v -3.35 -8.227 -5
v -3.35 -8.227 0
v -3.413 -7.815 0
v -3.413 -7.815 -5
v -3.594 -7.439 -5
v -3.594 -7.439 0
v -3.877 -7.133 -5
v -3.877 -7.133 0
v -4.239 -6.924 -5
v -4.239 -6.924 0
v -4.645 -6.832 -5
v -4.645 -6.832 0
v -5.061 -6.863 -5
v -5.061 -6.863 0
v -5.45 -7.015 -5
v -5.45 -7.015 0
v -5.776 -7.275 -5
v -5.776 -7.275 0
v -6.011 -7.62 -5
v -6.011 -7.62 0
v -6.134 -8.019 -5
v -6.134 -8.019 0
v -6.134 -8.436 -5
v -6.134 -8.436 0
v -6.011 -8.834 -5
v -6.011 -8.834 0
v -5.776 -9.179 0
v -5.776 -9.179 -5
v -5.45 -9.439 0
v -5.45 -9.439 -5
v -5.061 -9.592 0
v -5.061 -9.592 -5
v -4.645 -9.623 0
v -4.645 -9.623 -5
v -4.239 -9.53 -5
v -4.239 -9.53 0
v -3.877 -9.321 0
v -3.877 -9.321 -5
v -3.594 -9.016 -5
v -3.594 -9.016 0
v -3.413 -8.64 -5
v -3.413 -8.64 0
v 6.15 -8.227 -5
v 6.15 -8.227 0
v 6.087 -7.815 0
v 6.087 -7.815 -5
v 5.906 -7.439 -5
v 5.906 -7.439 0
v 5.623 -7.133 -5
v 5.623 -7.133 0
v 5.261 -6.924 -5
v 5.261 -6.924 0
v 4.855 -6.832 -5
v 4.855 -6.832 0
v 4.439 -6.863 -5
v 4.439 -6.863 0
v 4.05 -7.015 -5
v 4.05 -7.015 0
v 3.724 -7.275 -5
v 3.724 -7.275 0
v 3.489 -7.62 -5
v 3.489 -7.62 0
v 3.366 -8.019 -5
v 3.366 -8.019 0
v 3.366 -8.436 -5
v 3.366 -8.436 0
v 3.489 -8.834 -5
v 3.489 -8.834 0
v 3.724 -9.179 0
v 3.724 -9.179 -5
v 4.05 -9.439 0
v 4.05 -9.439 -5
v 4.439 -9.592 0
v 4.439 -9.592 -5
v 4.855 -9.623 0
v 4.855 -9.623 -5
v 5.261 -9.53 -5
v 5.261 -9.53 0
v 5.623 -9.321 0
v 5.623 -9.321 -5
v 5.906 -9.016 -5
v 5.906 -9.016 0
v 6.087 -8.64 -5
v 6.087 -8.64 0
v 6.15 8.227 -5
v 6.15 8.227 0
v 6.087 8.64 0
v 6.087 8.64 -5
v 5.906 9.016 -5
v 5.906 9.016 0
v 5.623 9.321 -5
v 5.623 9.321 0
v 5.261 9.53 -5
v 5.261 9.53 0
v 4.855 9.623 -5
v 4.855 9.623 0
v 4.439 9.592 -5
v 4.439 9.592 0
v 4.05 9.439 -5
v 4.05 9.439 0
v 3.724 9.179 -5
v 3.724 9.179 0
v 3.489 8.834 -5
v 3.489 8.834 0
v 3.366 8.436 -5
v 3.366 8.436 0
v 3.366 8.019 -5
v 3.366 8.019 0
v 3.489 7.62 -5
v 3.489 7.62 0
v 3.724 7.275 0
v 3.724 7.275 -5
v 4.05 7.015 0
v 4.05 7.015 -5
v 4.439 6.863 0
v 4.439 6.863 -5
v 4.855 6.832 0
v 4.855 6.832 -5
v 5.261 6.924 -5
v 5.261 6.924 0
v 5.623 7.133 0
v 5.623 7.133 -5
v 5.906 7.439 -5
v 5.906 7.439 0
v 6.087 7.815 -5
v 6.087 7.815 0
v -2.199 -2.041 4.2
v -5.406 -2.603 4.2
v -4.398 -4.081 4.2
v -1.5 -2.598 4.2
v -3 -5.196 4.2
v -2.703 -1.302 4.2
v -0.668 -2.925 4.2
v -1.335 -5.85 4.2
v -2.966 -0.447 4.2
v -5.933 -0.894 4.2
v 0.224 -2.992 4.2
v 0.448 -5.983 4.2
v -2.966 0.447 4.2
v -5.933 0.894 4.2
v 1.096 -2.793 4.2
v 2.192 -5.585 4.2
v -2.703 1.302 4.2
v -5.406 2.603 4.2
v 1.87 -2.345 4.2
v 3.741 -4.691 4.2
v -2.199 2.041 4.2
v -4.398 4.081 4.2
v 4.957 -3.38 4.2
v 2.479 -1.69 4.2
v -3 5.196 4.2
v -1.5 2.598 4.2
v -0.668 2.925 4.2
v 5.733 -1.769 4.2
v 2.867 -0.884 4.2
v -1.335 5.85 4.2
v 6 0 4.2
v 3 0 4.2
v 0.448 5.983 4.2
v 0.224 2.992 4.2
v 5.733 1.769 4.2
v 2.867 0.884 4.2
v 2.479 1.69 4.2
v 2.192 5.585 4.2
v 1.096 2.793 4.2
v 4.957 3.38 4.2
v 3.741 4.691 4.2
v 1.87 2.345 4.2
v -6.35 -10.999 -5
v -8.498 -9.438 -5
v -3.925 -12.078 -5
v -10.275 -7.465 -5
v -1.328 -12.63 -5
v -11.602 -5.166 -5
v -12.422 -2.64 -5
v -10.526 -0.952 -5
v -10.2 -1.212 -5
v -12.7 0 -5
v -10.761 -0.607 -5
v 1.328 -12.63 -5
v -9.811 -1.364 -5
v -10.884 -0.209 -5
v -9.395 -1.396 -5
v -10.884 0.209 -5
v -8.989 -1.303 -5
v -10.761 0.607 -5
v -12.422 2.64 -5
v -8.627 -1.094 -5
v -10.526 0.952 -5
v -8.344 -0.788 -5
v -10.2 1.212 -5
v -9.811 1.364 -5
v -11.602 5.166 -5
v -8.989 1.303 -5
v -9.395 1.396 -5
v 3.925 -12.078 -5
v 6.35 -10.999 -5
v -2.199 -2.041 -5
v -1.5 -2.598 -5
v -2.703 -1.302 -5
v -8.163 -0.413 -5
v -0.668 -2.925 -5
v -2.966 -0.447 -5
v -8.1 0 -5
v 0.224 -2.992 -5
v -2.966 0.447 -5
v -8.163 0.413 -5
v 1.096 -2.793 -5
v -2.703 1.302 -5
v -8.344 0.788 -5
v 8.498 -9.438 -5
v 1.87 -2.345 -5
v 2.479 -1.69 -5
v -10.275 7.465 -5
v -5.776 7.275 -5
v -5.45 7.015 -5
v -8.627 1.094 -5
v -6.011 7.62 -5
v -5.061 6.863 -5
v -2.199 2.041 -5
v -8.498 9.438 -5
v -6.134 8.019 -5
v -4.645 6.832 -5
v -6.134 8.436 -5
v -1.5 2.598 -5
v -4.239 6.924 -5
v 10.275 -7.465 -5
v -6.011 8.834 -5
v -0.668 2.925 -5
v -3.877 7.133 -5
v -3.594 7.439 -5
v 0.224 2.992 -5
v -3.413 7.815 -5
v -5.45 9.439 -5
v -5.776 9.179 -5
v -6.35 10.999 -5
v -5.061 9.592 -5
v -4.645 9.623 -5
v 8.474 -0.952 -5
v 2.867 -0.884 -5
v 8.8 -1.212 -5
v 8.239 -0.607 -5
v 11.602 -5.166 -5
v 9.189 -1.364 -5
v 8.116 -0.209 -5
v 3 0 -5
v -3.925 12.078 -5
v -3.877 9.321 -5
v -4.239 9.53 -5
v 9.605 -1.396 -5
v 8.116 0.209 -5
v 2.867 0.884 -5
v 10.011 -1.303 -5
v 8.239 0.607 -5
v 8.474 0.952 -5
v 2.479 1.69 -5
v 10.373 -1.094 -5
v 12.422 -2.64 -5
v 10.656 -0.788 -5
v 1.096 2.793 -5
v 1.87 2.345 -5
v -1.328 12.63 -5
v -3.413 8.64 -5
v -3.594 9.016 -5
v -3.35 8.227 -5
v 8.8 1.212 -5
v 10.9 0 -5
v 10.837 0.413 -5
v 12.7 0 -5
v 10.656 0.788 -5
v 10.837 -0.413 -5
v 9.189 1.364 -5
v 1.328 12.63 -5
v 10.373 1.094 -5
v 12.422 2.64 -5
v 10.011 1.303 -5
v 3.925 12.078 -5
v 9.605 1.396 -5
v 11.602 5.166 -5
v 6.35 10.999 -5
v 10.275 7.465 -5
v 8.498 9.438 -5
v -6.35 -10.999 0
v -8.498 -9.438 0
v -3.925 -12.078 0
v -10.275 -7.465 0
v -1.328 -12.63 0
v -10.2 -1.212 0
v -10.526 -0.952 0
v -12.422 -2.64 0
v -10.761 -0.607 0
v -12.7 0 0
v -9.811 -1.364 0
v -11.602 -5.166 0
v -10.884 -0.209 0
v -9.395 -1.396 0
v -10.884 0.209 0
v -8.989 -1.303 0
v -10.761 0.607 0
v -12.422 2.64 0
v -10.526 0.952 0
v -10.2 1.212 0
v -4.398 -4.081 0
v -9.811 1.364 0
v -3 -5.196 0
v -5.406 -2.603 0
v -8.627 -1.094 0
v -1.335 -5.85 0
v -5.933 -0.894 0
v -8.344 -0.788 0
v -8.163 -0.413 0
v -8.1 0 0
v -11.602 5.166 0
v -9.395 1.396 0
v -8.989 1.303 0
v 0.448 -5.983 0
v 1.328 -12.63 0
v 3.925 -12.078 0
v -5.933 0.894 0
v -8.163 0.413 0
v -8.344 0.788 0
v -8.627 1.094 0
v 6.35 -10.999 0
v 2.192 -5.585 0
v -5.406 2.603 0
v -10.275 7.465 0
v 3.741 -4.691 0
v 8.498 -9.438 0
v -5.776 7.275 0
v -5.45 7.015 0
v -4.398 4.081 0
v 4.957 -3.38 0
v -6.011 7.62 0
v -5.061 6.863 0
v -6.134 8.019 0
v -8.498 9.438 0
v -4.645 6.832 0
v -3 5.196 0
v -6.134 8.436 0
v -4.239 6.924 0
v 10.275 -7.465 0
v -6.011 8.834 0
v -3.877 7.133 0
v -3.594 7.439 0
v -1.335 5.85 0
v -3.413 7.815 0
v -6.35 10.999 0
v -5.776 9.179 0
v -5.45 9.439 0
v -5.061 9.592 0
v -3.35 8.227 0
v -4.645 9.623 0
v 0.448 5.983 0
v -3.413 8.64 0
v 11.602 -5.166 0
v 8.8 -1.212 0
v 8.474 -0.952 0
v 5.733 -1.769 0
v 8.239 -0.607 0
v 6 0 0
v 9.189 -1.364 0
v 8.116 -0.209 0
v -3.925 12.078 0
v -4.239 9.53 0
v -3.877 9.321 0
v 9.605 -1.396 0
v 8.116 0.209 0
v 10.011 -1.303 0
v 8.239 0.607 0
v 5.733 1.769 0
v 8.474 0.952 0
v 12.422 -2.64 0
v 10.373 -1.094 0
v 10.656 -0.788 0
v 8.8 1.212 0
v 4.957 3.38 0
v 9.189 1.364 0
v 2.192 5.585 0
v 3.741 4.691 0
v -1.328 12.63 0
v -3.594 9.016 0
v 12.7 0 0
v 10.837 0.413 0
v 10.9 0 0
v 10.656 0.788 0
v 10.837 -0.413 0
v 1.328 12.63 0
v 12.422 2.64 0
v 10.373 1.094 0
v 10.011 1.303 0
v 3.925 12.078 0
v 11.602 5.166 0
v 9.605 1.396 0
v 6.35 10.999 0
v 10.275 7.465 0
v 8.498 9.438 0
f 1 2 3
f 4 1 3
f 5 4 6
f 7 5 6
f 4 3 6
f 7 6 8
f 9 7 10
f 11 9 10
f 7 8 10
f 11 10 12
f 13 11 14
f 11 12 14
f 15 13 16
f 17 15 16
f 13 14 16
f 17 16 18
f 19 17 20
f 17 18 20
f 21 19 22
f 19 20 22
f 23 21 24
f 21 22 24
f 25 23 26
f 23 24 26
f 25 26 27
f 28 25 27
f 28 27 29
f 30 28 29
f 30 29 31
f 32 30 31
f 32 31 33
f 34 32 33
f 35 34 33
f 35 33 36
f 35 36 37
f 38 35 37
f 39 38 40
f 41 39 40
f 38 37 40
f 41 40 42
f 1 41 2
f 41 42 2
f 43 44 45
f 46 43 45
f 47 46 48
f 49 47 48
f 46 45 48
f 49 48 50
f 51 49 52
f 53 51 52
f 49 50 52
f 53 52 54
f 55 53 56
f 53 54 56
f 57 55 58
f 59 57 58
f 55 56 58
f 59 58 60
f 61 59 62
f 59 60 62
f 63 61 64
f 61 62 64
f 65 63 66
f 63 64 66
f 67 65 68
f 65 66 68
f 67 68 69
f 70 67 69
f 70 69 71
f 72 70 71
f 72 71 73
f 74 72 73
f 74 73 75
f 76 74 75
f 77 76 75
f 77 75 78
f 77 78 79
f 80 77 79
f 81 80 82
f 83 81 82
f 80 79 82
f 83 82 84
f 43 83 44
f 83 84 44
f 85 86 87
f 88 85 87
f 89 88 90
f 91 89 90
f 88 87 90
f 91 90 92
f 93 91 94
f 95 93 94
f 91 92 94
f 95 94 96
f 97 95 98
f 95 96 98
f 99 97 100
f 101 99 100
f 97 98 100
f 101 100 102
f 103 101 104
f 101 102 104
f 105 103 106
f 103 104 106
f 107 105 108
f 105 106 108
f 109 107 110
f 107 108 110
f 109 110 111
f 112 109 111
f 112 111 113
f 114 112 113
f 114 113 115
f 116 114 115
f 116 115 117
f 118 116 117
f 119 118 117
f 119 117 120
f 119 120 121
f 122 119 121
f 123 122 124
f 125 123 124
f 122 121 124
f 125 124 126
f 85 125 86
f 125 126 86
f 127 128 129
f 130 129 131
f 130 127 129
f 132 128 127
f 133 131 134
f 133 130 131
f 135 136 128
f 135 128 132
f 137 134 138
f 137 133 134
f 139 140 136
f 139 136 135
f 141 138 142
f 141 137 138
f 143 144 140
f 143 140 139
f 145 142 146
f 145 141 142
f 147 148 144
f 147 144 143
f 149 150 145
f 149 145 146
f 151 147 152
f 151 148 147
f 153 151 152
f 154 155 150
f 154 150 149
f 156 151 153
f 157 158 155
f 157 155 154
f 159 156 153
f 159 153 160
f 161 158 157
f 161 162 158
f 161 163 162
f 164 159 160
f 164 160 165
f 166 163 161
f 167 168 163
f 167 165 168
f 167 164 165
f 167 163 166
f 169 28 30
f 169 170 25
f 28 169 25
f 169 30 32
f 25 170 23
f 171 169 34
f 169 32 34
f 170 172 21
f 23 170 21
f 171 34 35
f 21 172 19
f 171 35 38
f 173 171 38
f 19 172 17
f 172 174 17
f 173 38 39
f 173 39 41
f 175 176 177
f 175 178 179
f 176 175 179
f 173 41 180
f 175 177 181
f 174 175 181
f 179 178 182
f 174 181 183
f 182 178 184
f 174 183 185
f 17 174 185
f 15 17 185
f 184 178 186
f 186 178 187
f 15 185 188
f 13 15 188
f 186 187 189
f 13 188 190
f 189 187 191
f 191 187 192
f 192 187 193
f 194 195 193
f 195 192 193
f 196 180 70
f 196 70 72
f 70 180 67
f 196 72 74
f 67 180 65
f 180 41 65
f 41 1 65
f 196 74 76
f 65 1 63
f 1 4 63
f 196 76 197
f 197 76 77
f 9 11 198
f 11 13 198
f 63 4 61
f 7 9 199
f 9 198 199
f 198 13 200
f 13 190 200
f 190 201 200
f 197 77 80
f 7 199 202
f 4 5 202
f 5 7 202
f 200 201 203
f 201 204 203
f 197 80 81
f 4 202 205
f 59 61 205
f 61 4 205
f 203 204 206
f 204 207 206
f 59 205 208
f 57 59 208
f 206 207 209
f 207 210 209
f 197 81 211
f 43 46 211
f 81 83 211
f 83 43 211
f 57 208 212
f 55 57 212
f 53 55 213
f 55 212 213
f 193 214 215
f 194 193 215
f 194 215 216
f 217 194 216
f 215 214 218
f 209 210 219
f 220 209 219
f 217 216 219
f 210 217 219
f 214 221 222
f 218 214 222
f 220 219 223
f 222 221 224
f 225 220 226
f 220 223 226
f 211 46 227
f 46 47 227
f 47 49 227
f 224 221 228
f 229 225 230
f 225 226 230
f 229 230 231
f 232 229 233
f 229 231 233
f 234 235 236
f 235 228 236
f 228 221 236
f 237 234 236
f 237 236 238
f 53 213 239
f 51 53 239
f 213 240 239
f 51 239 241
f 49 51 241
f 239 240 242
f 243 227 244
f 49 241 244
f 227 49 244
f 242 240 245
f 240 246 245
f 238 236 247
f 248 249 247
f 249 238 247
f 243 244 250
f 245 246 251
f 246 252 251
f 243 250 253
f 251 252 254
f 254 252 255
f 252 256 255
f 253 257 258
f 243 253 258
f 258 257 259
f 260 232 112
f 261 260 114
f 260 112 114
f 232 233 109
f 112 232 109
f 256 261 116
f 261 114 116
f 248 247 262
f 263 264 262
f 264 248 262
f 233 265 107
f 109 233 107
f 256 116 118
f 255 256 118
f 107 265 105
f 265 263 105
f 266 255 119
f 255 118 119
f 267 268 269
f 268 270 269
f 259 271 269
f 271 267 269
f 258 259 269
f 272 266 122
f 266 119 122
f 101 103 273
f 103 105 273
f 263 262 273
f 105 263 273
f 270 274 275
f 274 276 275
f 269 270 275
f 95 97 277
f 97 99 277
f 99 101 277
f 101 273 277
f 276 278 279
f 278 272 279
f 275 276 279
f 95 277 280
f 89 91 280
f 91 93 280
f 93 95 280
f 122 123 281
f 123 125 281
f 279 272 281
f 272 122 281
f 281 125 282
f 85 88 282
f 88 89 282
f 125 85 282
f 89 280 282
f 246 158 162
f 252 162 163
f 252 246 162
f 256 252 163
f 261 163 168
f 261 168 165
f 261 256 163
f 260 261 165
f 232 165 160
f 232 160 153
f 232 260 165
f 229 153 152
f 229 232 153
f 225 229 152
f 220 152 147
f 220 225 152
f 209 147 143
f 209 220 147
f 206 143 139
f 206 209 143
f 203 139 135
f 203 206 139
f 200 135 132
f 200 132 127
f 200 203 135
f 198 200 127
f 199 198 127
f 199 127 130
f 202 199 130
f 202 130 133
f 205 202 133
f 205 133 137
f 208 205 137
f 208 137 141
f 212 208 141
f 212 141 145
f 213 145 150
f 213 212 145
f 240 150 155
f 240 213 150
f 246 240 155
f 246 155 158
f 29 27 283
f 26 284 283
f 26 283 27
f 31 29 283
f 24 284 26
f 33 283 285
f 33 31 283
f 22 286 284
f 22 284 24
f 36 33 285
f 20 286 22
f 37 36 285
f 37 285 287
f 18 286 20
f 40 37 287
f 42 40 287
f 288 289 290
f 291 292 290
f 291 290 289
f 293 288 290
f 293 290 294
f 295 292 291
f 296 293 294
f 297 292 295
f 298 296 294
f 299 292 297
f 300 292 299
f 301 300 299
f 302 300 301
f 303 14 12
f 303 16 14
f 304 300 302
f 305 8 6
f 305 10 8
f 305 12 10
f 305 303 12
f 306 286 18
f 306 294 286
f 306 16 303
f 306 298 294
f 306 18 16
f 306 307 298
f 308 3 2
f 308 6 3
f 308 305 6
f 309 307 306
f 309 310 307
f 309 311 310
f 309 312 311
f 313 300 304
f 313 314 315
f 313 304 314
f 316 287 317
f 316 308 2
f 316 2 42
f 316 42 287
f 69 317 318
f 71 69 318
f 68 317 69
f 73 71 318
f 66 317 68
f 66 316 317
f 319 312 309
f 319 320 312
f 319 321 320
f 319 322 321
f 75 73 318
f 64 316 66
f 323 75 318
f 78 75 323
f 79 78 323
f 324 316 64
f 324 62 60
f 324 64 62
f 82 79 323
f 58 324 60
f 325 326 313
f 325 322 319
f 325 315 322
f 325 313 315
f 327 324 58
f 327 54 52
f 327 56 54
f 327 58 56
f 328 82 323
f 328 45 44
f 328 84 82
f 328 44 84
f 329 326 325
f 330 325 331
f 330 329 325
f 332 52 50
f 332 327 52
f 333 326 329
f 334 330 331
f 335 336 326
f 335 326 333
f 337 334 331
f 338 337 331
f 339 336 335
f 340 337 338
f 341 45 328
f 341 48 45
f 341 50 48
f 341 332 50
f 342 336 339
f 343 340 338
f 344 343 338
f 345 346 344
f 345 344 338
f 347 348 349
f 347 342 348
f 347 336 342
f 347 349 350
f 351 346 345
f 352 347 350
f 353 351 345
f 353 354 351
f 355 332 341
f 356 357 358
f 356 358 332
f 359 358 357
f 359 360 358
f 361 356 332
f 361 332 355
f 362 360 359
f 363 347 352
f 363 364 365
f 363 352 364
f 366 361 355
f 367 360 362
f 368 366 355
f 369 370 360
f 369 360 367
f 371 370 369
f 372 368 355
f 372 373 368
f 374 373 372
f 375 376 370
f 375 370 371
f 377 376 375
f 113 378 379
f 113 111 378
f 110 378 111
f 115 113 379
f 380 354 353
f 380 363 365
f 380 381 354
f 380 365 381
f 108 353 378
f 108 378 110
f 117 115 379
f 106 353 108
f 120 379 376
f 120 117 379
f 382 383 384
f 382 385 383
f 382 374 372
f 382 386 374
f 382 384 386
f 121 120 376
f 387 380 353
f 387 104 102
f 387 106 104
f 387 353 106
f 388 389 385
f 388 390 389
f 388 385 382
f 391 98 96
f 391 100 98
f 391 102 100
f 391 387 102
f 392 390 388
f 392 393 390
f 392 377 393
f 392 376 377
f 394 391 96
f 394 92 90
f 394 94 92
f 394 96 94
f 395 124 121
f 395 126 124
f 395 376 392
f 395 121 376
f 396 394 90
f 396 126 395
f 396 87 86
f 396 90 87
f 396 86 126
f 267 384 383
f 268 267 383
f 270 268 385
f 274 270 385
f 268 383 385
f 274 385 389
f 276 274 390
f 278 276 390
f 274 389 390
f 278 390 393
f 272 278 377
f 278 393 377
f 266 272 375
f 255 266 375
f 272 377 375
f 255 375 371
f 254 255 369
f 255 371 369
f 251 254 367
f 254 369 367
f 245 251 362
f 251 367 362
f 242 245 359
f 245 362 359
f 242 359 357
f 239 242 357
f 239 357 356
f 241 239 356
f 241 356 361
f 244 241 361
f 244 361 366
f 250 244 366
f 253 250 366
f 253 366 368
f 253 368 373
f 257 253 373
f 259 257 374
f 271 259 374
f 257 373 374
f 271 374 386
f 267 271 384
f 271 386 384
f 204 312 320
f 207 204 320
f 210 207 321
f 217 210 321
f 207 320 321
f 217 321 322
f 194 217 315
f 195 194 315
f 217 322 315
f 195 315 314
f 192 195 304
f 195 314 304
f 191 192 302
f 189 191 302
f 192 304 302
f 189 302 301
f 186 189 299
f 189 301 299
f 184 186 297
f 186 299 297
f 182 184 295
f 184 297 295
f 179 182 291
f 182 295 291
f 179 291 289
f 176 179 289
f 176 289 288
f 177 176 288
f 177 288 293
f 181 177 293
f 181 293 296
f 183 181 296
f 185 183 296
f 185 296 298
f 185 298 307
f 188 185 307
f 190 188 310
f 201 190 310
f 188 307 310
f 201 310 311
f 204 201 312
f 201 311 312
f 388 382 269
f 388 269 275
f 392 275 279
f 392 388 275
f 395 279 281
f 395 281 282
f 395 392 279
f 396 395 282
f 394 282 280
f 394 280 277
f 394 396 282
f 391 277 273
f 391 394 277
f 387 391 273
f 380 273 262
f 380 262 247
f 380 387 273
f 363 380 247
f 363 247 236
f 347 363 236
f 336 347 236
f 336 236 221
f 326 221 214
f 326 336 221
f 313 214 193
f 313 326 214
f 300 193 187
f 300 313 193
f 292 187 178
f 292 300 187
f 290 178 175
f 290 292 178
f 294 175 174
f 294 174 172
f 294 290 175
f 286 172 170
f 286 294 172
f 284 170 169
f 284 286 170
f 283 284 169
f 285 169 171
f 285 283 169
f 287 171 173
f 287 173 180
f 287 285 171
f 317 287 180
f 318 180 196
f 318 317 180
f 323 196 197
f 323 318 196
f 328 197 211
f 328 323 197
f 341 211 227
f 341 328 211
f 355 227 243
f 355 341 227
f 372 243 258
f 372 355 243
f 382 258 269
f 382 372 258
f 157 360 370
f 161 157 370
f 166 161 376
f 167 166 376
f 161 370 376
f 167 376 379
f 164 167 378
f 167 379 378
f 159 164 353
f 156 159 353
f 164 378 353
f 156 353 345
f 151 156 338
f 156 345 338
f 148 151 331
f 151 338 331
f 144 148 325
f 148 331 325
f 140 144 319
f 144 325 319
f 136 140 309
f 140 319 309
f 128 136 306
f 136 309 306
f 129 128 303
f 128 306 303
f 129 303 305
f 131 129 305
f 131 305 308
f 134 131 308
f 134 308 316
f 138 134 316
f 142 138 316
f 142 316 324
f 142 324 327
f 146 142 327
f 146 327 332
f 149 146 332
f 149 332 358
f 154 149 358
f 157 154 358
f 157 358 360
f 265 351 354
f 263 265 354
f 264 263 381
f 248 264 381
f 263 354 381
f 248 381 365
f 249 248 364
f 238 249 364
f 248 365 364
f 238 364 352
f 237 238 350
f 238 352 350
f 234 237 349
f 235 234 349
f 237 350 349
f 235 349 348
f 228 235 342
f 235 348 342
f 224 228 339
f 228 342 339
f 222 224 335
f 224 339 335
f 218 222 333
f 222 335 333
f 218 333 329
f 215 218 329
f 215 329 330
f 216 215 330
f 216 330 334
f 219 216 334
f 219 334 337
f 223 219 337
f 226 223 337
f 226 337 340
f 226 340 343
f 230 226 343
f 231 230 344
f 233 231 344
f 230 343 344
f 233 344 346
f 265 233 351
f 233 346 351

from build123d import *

# Parameters (mm, degrees)
SKETCH_1_R           = 12.7
SKETCH_1_R_2         = 1.39954
SKETCH_1_R_3         = 6
EXTRUDE_1_DEPTH      = 5
EXTRUDE_2_DEPTH      = 4.2
EXTRUDE_2_DEPTH_BACK = 5
SKETCH_1_3_R         = 6
SKETCH_1_3_R_2       = 3


with BuildPart() as part:
    # Sketch 1 → Extrude 1 (new body)
    with BuildSketch(Plane.XY):
        Circle(SKETCH_1_R)
        with Locations((4.75, 8.227241336)):
            Circle(SKETCH_1_R_2, mode=Mode.SUBTRACT)
        with Locations((-4.75, 8.227241336)):
            Circle(SKETCH_1_R_2, mode=Mode.SUBTRACT)
        with Locations((-9.5, 0)):
            Circle(SKETCH_1_R_2, mode=Mode.SUBTRACT)
        with Locations((-4.75, -8.227241336)):
            Circle(SKETCH_1_R_2, mode=Mode.SUBTRACT)
        with Locations((4.75, -8.227241336)):
            Circle(SKETCH_1_R_2, mode=Mode.SUBTRACT)
        with Locations((9.5, 0)):
            Circle(SKETCH_1_R_2, mode=Mode.SUBTRACT)
        Circle(SKETCH_1_R_3, mode=Mode.SUBTRACT)
    extrude(amount=-EXTRUDE_1_DEPTH)

    # Sketch 1_3 → Extrude 2 (add, two sides: drawn at the far end of the back side and taken through both)
    with BuildSketch(Plane.XY.offset(-EXTRUDE_2_DEPTH_BACK)):
        Circle(SKETCH_1_3_R)
        Circle(SKETCH_1_3_R_2, mode=Mode.SUBTRACT)
    extrude(amount=EXTRUDE_2_DEPTH + EXTRUDE_2_DEPTH_BACK)


solid = part.part
